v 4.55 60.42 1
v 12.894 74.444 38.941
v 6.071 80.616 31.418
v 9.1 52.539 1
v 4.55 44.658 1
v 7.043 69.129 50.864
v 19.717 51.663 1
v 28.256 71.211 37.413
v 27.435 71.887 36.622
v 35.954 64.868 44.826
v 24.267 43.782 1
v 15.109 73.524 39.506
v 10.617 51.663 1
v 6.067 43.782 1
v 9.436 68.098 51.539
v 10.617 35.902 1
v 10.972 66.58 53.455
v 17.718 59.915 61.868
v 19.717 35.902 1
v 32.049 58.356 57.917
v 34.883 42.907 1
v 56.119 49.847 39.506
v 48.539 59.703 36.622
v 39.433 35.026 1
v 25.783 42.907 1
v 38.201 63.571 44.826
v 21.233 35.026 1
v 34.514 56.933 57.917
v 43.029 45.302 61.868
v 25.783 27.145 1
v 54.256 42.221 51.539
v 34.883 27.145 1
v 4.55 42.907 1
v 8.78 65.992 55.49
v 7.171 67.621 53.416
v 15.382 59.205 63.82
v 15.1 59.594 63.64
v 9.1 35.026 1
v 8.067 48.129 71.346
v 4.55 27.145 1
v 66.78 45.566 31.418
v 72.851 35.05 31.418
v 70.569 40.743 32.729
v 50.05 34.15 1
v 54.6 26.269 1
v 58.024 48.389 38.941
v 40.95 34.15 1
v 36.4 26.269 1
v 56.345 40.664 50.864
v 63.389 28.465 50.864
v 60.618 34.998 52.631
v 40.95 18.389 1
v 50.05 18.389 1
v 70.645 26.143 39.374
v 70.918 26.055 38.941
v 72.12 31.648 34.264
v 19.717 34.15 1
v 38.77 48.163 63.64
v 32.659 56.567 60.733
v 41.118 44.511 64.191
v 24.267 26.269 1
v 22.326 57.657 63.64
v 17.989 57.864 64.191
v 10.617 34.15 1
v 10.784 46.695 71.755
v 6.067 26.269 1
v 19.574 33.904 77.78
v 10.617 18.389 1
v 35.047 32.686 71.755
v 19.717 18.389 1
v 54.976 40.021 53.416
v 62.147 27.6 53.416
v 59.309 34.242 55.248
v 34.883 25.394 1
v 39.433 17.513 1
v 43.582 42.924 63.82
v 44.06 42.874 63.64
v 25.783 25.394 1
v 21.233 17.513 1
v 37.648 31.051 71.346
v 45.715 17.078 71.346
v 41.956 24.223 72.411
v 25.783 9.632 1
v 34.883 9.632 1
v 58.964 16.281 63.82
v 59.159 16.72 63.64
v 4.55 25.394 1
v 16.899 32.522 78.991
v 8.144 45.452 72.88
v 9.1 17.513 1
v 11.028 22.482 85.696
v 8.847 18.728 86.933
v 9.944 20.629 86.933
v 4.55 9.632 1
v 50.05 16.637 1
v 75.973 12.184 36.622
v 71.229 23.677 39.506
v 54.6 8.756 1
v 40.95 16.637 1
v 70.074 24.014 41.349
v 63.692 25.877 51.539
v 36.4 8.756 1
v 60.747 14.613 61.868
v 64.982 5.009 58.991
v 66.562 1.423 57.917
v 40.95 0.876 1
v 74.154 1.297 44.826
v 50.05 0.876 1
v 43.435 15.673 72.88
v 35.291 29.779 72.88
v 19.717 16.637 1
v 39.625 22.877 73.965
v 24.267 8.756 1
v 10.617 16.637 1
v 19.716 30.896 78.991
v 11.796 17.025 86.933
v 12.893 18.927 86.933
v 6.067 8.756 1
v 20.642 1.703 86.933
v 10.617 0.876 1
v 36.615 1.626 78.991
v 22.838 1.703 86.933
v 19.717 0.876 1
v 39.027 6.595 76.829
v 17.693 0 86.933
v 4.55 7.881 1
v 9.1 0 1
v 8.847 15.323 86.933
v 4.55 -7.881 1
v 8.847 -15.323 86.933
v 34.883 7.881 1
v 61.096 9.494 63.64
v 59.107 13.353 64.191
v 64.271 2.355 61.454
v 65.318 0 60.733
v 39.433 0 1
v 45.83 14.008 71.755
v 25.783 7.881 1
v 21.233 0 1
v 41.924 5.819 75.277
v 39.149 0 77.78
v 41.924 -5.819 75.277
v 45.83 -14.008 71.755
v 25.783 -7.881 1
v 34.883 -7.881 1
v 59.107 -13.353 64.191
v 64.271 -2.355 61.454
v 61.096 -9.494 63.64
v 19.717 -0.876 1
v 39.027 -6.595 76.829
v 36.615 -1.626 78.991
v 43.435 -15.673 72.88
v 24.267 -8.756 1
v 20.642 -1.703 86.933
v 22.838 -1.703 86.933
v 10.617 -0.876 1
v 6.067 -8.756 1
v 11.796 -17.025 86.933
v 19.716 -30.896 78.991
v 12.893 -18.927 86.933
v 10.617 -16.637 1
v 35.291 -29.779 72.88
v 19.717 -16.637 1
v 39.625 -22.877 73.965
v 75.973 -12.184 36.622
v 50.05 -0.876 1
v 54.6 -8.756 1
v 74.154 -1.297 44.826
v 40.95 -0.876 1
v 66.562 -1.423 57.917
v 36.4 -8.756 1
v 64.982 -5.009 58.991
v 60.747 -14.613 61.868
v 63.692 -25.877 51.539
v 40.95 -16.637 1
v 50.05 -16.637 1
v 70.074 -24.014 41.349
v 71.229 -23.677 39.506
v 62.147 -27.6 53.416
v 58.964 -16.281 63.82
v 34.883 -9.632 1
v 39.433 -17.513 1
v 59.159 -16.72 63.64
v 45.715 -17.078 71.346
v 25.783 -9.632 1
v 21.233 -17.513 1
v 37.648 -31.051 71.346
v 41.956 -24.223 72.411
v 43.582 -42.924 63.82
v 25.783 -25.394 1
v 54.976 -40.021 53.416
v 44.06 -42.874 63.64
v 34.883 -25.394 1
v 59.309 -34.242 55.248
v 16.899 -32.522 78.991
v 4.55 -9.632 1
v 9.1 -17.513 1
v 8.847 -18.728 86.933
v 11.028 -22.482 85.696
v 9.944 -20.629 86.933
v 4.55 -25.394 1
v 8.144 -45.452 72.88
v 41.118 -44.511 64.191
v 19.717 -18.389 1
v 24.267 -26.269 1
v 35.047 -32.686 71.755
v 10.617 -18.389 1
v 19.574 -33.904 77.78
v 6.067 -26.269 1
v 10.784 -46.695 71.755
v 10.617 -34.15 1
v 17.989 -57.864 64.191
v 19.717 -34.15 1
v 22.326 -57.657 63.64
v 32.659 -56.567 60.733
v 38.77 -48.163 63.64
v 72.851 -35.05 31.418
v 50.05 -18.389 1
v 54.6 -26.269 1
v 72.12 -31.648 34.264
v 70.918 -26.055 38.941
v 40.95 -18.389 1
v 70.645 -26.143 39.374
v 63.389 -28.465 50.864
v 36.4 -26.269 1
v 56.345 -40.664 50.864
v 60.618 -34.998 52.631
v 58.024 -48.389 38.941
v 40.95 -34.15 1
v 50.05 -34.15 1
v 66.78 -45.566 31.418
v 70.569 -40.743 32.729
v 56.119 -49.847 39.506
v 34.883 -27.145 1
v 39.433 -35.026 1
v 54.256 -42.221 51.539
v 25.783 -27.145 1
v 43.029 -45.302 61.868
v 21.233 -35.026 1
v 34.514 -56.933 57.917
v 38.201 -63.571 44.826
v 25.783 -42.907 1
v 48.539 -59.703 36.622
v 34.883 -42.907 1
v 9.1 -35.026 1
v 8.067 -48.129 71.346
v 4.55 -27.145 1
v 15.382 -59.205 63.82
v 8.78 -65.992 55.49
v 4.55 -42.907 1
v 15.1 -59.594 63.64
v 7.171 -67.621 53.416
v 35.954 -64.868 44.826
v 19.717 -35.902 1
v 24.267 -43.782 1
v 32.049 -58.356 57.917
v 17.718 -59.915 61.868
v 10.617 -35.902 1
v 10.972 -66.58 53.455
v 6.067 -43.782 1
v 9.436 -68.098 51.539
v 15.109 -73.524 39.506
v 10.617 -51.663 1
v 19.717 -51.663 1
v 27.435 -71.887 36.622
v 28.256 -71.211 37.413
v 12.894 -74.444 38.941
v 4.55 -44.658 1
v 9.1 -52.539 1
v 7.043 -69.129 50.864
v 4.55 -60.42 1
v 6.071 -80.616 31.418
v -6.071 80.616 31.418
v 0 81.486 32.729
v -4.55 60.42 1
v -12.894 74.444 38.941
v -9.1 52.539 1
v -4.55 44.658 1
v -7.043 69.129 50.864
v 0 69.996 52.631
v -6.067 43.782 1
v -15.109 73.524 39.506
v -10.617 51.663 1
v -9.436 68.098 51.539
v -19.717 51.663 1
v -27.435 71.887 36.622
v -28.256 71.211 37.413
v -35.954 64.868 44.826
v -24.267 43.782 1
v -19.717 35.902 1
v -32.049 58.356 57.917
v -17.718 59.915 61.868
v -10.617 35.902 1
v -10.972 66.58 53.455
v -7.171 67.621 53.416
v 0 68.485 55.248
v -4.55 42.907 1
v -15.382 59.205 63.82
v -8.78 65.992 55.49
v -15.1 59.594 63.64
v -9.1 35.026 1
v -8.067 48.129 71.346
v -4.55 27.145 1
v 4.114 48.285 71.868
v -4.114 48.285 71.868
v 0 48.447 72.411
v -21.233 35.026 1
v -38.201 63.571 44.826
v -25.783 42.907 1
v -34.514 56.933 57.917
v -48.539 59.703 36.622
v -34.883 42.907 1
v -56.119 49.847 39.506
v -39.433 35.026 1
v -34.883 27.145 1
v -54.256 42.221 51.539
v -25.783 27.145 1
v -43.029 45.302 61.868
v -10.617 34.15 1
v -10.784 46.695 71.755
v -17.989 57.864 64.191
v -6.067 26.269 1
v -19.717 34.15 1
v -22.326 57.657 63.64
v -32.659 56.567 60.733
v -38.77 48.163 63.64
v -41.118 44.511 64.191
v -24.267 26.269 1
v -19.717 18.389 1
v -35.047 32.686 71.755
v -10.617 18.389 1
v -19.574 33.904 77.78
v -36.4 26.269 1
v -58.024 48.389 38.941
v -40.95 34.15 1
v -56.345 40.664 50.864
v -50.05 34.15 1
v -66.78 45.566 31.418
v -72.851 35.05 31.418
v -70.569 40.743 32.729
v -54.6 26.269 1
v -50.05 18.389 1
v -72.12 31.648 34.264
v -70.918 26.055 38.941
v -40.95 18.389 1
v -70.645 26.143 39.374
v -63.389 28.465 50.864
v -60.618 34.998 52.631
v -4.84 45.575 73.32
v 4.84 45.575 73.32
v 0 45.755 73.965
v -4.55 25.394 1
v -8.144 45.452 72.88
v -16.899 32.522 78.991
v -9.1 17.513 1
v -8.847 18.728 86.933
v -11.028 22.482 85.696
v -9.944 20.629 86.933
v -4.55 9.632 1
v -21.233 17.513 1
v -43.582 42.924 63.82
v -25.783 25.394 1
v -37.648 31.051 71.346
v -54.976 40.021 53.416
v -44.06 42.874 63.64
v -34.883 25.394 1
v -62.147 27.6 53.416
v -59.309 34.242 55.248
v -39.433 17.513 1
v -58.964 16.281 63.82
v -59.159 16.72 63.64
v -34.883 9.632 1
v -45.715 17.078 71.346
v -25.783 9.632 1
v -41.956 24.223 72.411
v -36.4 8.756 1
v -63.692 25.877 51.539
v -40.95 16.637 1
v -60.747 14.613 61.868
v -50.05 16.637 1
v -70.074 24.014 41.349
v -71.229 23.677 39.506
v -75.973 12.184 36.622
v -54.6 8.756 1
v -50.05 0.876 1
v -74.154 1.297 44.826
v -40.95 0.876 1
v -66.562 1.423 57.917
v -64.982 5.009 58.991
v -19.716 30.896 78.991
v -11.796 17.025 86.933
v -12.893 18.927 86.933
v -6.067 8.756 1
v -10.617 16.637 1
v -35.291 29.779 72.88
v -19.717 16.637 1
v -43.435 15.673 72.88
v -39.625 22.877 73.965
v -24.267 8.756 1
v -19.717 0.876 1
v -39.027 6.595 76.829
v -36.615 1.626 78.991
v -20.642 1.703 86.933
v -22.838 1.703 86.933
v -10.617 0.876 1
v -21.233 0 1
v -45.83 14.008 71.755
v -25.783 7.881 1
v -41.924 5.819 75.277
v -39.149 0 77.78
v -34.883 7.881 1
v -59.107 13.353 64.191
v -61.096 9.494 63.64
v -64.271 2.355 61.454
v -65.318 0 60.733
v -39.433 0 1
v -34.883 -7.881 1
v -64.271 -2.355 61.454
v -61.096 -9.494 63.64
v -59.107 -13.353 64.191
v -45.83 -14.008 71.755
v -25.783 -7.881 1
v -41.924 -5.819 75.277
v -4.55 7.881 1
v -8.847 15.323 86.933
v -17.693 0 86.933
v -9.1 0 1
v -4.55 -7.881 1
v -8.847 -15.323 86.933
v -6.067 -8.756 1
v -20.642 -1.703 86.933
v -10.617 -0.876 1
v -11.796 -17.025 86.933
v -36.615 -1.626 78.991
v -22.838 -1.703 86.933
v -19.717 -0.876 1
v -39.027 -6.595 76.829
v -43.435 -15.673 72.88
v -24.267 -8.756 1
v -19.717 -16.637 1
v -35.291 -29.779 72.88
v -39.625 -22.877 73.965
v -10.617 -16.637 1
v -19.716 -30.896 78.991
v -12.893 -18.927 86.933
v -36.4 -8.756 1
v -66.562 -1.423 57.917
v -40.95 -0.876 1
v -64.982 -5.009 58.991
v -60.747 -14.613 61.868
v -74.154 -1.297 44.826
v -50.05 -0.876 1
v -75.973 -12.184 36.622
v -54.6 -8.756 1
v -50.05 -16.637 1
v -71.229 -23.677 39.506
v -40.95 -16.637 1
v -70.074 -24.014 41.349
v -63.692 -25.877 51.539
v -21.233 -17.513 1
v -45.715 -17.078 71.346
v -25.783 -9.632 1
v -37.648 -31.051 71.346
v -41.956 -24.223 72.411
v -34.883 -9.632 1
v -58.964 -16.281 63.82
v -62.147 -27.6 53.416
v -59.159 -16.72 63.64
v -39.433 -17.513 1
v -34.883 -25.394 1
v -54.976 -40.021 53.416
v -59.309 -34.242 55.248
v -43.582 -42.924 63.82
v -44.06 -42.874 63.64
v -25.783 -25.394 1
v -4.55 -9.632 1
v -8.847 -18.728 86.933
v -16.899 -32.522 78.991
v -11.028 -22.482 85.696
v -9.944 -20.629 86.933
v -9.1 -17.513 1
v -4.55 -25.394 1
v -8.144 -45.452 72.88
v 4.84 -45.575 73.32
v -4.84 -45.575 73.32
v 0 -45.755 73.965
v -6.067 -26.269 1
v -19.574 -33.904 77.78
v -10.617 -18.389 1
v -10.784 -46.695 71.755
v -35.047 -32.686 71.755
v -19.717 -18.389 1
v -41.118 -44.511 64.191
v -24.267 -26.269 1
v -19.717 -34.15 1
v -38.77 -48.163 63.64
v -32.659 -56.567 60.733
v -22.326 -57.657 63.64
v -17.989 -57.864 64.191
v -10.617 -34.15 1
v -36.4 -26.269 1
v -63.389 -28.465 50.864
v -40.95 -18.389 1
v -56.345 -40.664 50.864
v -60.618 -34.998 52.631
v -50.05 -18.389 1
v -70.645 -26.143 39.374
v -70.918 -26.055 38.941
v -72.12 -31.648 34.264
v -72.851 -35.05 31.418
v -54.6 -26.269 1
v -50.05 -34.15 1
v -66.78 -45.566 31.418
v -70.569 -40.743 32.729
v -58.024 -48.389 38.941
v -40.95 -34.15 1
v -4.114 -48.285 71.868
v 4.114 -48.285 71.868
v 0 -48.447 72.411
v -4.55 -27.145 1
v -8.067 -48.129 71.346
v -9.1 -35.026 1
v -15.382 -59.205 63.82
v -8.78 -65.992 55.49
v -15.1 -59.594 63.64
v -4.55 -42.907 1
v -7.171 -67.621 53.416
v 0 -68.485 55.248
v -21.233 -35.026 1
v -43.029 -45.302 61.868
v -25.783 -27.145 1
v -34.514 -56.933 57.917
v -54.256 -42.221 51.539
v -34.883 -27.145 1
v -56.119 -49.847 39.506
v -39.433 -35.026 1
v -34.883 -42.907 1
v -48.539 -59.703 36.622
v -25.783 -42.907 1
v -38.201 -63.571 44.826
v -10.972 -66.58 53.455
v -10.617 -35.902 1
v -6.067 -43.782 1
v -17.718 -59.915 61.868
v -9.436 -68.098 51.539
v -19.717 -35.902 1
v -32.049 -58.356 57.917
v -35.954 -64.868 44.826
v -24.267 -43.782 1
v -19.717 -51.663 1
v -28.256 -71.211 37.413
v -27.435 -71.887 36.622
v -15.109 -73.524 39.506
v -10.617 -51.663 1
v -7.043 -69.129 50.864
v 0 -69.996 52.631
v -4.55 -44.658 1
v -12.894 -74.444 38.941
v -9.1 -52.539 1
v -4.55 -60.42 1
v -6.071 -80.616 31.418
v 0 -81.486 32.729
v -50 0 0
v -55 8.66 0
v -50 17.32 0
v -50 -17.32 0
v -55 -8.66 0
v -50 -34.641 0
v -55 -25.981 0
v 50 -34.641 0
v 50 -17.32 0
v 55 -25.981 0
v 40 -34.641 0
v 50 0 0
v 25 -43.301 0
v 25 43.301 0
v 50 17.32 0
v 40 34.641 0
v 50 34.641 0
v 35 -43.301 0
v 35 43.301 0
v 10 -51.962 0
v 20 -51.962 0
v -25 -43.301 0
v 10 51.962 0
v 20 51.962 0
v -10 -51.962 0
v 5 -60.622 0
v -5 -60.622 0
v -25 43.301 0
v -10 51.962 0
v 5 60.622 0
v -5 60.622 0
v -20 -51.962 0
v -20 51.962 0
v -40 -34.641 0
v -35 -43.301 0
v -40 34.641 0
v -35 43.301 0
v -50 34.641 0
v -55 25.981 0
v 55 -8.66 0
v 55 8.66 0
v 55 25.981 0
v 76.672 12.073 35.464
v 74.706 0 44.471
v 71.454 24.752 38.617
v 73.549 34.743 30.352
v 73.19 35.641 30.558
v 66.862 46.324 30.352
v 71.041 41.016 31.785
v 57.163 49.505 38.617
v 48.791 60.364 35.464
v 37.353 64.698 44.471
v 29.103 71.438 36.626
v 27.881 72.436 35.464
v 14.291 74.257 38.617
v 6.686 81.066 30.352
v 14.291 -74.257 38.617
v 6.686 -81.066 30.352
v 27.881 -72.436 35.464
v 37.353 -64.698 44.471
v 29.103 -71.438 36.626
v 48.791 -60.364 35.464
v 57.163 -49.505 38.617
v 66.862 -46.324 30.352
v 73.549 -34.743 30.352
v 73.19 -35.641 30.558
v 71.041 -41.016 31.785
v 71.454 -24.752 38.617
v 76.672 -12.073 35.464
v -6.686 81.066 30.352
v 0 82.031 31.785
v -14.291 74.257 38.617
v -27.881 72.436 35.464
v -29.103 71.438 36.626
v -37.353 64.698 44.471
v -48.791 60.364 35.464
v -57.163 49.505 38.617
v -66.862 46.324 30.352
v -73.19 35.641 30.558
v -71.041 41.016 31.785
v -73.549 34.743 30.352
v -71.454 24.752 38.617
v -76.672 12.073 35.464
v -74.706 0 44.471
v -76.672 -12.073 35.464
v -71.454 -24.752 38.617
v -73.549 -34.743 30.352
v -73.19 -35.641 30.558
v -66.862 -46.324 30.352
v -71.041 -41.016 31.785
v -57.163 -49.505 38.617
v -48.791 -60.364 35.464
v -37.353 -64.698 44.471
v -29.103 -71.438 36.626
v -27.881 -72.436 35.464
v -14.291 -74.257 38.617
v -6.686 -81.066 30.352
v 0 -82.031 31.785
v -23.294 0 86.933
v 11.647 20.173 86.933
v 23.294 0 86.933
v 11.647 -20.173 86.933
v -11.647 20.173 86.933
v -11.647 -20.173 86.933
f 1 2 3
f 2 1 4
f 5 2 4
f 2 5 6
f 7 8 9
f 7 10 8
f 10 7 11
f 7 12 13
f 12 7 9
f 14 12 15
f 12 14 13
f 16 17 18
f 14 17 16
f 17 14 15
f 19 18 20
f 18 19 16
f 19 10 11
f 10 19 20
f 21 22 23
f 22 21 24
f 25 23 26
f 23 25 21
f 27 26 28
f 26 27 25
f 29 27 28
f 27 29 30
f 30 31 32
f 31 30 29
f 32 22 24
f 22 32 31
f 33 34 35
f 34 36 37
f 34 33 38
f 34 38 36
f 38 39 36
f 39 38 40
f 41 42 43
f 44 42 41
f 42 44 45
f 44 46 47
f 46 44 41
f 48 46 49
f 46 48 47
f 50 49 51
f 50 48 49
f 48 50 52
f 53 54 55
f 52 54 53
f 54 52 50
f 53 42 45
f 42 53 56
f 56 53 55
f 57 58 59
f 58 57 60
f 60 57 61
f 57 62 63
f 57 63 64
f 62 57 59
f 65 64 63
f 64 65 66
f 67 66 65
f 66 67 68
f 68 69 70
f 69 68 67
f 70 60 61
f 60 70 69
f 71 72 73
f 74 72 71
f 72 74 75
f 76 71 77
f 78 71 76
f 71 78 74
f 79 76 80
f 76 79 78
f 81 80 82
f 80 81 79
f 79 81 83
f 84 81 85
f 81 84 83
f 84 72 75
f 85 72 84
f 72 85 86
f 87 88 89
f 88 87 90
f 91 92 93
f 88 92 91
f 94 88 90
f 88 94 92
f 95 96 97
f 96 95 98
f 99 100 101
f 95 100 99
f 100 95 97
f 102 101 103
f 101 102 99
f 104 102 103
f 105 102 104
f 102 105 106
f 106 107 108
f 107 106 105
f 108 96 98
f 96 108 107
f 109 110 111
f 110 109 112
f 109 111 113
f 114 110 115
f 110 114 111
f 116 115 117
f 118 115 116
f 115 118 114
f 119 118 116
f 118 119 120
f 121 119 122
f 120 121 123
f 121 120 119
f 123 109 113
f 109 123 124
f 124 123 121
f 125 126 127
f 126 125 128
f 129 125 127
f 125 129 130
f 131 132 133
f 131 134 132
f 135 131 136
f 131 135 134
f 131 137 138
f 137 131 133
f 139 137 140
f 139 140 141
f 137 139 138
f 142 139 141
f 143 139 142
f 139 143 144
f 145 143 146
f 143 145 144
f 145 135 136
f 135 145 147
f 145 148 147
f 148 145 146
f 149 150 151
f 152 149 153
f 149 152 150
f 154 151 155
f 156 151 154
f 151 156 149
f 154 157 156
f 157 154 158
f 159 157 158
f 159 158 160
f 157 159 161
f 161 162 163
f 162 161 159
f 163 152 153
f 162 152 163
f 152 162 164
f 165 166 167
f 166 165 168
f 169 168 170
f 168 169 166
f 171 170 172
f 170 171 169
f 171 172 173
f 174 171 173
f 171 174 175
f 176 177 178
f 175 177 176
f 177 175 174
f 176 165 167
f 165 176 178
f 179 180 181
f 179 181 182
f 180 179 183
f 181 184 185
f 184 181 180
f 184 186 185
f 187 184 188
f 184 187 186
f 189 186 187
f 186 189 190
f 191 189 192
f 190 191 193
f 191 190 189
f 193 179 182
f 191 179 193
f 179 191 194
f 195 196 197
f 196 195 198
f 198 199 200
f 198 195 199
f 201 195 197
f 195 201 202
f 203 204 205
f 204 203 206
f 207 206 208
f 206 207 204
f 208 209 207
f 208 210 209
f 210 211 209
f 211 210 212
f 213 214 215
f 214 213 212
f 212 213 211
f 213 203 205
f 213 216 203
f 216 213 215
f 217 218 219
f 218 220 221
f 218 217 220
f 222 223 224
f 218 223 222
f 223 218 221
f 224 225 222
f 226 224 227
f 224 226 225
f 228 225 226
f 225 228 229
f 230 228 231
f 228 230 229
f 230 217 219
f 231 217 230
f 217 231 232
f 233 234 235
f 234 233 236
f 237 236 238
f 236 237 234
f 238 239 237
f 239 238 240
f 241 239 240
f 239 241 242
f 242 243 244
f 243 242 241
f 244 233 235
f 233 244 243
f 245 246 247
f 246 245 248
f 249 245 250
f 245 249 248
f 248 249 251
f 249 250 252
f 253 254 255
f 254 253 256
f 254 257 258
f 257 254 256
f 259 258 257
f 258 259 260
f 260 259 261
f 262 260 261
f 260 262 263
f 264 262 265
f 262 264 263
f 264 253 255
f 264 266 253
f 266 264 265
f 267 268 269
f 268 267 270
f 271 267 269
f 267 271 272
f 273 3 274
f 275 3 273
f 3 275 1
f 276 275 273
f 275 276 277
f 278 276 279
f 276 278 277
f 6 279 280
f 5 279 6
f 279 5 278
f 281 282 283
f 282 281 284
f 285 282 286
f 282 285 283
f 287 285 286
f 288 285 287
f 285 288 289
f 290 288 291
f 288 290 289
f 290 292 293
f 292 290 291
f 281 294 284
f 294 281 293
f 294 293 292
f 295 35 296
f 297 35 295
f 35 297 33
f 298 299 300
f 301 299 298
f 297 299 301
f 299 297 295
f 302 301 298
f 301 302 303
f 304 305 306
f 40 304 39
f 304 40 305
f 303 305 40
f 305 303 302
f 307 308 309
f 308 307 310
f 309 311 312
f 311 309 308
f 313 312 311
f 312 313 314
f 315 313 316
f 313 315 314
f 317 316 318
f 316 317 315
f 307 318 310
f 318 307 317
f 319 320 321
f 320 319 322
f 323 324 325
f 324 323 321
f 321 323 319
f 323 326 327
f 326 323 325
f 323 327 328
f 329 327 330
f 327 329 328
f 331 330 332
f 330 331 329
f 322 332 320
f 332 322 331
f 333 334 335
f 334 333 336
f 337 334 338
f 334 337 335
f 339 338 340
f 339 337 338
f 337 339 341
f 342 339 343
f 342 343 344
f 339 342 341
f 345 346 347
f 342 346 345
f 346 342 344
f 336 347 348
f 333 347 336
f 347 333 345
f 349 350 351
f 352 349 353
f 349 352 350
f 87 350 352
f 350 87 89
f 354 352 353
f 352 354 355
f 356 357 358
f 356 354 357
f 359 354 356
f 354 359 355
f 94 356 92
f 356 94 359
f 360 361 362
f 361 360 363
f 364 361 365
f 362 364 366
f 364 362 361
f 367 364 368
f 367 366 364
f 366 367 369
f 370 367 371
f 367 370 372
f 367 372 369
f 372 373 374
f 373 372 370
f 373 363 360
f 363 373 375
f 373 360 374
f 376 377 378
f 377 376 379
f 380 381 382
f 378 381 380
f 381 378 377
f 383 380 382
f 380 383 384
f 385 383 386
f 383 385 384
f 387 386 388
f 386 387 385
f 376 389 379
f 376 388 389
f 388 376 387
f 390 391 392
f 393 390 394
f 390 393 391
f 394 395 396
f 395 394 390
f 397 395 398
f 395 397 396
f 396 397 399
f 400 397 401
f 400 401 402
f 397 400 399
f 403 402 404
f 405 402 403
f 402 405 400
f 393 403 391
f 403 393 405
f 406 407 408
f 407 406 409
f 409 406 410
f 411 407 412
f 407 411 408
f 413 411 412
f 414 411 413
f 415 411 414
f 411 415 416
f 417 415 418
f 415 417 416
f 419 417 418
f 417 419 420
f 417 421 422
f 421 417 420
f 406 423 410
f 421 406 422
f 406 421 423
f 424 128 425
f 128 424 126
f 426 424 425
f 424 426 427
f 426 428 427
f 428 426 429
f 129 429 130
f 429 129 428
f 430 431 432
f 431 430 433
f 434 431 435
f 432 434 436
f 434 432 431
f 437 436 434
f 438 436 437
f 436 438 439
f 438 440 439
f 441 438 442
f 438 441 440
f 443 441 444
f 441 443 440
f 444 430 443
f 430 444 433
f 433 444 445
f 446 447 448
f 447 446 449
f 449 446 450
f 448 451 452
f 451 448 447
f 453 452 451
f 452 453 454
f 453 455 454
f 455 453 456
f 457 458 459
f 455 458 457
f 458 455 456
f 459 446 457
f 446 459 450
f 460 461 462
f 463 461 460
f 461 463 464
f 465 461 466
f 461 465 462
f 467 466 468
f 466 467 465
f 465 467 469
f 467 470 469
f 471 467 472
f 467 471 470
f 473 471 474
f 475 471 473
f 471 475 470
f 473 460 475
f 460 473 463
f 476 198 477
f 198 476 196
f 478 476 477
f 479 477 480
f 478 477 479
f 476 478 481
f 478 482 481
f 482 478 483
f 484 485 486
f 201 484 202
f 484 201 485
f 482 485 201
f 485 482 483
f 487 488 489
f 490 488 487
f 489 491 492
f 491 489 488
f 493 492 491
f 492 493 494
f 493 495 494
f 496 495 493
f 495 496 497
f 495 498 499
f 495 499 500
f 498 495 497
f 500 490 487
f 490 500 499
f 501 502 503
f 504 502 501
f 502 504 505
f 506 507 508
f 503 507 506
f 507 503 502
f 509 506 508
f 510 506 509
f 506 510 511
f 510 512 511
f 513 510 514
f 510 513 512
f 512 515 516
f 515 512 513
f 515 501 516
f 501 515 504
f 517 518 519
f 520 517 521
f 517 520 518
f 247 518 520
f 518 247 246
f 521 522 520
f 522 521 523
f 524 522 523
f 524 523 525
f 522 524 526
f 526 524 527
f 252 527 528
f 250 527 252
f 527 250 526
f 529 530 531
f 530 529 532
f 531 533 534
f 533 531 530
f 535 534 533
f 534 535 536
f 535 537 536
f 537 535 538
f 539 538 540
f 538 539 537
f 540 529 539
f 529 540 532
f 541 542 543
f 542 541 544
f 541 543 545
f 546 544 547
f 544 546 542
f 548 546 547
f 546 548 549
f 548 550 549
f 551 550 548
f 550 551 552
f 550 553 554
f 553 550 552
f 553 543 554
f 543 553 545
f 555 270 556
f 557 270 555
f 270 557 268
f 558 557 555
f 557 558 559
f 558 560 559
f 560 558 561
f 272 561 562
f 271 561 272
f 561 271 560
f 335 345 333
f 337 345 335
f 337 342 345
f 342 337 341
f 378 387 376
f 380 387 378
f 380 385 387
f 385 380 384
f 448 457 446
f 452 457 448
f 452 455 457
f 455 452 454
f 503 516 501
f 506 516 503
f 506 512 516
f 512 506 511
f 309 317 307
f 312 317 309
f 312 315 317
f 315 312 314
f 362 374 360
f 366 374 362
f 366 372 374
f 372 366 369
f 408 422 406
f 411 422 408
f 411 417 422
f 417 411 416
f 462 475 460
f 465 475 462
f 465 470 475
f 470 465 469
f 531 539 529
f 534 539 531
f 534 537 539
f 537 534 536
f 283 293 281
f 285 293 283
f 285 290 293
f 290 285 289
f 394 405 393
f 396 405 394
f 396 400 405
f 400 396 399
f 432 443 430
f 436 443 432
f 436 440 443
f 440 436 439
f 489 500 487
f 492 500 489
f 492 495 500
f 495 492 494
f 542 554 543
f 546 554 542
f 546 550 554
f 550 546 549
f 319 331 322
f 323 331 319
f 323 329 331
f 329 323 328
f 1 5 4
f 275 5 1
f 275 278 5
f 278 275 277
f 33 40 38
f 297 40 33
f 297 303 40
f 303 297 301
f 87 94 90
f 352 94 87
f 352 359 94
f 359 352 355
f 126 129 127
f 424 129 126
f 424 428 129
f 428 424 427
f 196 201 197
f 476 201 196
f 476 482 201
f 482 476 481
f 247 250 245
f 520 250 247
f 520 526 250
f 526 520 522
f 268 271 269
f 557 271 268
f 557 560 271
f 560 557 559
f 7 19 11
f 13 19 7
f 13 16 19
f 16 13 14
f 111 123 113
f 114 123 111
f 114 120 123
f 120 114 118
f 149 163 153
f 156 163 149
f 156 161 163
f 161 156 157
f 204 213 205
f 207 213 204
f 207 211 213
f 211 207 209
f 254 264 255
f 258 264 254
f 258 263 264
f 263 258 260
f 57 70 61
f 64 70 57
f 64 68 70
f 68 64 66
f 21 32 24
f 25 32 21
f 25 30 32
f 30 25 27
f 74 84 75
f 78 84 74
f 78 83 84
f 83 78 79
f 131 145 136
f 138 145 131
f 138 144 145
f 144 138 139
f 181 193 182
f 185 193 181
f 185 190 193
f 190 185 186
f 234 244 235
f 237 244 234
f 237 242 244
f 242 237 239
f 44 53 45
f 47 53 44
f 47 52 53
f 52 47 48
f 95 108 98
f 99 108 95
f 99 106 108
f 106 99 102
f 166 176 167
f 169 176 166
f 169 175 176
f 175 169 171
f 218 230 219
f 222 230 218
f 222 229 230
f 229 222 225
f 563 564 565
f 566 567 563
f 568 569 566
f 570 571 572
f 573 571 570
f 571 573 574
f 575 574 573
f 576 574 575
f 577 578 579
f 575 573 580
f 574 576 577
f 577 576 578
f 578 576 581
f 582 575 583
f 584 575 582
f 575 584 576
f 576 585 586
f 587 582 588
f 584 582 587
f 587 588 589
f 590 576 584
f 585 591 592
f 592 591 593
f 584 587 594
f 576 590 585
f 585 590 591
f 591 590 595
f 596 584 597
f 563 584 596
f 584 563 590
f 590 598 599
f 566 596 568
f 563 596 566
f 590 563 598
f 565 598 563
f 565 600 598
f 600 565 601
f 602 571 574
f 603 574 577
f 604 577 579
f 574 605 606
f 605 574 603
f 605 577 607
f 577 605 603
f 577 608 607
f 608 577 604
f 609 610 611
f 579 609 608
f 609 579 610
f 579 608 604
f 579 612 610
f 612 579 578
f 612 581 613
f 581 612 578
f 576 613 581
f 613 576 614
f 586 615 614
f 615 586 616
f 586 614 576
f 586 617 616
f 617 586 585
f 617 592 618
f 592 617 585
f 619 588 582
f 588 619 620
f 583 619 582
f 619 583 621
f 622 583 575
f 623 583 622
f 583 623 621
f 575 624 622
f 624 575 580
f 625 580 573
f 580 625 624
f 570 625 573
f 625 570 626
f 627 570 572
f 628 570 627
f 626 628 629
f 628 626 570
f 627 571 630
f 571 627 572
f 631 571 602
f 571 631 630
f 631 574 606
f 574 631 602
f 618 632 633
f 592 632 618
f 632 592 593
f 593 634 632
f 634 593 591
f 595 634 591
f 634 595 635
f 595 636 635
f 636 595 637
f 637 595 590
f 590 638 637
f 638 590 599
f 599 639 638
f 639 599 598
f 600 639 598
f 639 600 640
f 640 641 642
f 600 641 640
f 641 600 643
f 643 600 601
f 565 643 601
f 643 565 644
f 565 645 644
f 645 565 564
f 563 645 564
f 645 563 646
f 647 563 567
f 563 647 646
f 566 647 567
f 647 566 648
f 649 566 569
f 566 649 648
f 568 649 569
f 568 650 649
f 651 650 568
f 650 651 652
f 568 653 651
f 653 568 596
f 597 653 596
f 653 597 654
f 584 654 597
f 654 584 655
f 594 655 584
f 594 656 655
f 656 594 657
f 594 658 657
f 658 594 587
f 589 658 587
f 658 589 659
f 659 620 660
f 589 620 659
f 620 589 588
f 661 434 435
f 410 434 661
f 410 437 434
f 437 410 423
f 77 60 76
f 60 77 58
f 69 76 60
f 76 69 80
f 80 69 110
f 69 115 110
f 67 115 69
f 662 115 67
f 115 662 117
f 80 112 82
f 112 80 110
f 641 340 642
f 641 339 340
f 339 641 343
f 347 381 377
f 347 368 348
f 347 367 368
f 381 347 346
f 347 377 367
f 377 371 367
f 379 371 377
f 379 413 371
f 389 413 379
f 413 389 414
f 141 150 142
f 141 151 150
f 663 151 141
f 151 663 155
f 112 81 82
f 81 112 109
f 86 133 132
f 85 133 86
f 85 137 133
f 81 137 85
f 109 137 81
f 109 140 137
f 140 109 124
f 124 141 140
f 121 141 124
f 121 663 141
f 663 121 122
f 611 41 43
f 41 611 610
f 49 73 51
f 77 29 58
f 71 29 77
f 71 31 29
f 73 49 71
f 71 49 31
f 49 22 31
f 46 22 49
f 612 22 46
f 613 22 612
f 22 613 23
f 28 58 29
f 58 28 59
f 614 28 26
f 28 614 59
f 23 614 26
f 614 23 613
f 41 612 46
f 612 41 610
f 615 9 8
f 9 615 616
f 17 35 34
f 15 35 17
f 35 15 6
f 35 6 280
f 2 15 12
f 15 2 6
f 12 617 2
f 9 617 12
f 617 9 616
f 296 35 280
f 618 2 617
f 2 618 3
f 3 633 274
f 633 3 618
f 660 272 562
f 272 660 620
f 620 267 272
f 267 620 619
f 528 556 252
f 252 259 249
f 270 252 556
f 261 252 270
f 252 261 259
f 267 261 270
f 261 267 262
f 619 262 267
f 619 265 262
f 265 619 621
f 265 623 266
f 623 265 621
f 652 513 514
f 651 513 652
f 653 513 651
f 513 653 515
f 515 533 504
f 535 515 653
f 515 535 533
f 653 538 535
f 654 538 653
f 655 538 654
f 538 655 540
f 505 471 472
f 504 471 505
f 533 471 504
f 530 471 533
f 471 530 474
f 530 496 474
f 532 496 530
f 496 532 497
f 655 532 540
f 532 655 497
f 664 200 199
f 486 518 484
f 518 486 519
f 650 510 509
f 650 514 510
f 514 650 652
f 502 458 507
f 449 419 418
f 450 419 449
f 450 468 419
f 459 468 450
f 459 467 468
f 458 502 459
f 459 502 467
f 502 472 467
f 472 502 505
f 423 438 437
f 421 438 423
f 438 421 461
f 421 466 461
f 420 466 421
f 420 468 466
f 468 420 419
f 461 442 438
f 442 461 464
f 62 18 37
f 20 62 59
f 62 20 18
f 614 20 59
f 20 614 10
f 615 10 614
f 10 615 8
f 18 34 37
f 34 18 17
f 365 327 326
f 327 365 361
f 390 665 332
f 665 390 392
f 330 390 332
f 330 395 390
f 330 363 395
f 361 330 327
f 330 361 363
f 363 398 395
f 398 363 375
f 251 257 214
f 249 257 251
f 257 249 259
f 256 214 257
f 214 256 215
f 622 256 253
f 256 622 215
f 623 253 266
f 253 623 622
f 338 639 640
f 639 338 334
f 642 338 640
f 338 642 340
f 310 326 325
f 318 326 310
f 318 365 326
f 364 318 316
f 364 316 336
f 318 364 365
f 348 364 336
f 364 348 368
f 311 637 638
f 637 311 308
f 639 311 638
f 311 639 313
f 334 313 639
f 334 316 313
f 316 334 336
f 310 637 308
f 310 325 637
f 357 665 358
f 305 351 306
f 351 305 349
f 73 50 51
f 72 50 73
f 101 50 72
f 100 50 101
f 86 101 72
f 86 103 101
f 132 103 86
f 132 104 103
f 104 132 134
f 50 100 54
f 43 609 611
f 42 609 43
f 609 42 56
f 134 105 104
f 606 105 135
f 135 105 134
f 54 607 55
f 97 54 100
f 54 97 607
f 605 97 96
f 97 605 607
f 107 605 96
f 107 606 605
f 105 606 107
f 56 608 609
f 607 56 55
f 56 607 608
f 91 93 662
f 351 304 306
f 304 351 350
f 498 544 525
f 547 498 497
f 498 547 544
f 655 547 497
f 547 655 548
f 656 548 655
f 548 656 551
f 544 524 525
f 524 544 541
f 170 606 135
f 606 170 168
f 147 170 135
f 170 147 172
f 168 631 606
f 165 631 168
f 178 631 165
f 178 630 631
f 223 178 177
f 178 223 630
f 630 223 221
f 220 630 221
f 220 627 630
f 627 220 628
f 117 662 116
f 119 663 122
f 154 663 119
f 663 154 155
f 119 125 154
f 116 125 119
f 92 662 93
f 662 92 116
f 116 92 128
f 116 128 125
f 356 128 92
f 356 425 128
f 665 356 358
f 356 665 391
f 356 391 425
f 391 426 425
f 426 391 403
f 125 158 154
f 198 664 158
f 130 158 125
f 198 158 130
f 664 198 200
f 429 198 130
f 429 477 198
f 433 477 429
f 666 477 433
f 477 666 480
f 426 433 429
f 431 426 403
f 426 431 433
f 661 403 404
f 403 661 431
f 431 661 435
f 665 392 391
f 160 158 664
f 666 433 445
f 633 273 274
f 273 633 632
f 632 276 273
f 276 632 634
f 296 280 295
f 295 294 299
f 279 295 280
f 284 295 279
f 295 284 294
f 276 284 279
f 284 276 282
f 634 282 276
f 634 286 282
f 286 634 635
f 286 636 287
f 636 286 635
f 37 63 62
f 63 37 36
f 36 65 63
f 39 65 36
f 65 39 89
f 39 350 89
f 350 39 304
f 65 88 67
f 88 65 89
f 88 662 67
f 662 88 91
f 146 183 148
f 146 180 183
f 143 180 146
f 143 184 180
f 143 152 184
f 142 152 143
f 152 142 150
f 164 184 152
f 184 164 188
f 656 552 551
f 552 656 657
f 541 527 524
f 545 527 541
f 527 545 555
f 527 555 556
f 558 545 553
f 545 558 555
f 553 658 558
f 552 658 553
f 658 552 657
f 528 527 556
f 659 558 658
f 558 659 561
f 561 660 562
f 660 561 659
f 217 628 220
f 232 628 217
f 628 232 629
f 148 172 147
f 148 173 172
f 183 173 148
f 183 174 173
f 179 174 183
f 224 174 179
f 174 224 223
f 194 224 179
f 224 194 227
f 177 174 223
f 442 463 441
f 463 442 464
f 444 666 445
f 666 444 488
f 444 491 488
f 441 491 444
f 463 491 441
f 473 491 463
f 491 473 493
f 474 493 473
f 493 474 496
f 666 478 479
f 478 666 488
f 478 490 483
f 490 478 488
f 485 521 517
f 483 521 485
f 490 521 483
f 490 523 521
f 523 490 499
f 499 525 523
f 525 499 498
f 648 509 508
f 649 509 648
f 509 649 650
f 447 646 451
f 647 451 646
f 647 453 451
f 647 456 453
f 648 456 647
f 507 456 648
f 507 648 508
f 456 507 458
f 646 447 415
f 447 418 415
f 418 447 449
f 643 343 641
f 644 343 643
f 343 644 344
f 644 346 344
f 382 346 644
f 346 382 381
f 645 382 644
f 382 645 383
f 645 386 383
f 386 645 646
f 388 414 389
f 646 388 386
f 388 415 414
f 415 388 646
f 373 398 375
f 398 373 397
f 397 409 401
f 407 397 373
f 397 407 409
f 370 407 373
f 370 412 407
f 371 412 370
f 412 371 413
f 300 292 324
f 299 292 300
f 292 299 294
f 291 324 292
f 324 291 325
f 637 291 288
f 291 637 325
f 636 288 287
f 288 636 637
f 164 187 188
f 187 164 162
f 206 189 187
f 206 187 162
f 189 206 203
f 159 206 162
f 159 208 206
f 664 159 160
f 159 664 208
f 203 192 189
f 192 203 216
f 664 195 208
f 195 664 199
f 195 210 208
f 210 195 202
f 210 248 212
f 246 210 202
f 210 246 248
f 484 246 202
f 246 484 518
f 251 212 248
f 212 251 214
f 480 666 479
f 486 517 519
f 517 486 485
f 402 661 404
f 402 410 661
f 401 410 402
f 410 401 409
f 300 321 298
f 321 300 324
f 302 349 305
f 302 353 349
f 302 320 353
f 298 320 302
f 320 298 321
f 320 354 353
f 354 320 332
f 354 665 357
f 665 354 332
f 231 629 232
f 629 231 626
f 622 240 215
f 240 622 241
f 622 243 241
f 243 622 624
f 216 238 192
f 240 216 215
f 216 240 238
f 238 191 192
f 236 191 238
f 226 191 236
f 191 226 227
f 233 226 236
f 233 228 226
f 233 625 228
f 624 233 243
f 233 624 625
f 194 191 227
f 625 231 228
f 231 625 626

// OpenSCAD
module hex(r) {
  circle(r = r, $fn = 6);
}

module hexgrid(hexcoord_list, r) {
  h = sqrt(3)*r;

  V = [0, h, 0];
  U = [6/4*r, 1/2*h, 0];

  for (vec = hexcoord_list) {
    i = vec[0];
    j = vec[1];

    translate(i*V + j*U)
    children();
  }

}

hexes = [for (j=[-7:1:7]) for (i=[-7:1:7]) [i,j]];

module honeyvase(hexes, height, twist, slicereso) {
  difference() {
    linear_extrude(height = height, slices = slicereso, twist = twist, scale=2)
    hexgrid(hexes, 10)
        hex(10);


  difference() {
      linear_extrude(height = height, slices = slicereso, twist = twist, scale=2)
      hexgrid(hexes, 10)
          hex(r = 9);
      cylinder(r = 90, h = 1);
    }
  }
}

module honeytwist() {
  //original honeytwist
  hexes = [ [ 2,-2],[ 2,-1],[ 2, 0],
            [ 1,-2],[ 1,-1],[ 1, 0],[ 1, 1],
            [ 0,-2],[ 0,-1],[ 0, 0],[ 0, 1], [ 0, 2],
                    [-1,-1],[-1, 0],[-1, 1], [-1, 2],
                            [-2, 0],[-2, 1], [-2, 2] ];
  intersection() {
    honeyvase(hexes, 100, 90, 100);
    sphere(r=90);
  }
}
module honeypot() {
  //honeypot
  hexes = [ [ 3, 0],[ 2, 1],[ 1, 2],[ 0, 3],
            [ 3,-1],[ 2, 0],[ 1, 1],[ 0, 2],[-1, 3],
            [ 3,-2],[ 2,-1],[ 1, 0],[ 0, 1],[-1, 2],[-2, 3],
            [ 3,-3],[ 2,-2],[ 1,-1],[ 0, 0],[-1, 1],[-2, 2],[-3, 3],
                    [ 2,-3],[ 1,-2],[ 0,-1],[-1, 0],[-2, 1],[-3, 2],
                            [ 1,-3],[ 0,-2],[-1,-1],[-2, 0],[-3, 1],
                                    [ 0,-3],[-1,-2],[-2,-1],[-3, 0] ];
  intersection() {
    honeyvase(hexes, 90, 0, 2);
    sphere(r=90, $fa=30);
  }
}
honeypot();
//honeytwist();
